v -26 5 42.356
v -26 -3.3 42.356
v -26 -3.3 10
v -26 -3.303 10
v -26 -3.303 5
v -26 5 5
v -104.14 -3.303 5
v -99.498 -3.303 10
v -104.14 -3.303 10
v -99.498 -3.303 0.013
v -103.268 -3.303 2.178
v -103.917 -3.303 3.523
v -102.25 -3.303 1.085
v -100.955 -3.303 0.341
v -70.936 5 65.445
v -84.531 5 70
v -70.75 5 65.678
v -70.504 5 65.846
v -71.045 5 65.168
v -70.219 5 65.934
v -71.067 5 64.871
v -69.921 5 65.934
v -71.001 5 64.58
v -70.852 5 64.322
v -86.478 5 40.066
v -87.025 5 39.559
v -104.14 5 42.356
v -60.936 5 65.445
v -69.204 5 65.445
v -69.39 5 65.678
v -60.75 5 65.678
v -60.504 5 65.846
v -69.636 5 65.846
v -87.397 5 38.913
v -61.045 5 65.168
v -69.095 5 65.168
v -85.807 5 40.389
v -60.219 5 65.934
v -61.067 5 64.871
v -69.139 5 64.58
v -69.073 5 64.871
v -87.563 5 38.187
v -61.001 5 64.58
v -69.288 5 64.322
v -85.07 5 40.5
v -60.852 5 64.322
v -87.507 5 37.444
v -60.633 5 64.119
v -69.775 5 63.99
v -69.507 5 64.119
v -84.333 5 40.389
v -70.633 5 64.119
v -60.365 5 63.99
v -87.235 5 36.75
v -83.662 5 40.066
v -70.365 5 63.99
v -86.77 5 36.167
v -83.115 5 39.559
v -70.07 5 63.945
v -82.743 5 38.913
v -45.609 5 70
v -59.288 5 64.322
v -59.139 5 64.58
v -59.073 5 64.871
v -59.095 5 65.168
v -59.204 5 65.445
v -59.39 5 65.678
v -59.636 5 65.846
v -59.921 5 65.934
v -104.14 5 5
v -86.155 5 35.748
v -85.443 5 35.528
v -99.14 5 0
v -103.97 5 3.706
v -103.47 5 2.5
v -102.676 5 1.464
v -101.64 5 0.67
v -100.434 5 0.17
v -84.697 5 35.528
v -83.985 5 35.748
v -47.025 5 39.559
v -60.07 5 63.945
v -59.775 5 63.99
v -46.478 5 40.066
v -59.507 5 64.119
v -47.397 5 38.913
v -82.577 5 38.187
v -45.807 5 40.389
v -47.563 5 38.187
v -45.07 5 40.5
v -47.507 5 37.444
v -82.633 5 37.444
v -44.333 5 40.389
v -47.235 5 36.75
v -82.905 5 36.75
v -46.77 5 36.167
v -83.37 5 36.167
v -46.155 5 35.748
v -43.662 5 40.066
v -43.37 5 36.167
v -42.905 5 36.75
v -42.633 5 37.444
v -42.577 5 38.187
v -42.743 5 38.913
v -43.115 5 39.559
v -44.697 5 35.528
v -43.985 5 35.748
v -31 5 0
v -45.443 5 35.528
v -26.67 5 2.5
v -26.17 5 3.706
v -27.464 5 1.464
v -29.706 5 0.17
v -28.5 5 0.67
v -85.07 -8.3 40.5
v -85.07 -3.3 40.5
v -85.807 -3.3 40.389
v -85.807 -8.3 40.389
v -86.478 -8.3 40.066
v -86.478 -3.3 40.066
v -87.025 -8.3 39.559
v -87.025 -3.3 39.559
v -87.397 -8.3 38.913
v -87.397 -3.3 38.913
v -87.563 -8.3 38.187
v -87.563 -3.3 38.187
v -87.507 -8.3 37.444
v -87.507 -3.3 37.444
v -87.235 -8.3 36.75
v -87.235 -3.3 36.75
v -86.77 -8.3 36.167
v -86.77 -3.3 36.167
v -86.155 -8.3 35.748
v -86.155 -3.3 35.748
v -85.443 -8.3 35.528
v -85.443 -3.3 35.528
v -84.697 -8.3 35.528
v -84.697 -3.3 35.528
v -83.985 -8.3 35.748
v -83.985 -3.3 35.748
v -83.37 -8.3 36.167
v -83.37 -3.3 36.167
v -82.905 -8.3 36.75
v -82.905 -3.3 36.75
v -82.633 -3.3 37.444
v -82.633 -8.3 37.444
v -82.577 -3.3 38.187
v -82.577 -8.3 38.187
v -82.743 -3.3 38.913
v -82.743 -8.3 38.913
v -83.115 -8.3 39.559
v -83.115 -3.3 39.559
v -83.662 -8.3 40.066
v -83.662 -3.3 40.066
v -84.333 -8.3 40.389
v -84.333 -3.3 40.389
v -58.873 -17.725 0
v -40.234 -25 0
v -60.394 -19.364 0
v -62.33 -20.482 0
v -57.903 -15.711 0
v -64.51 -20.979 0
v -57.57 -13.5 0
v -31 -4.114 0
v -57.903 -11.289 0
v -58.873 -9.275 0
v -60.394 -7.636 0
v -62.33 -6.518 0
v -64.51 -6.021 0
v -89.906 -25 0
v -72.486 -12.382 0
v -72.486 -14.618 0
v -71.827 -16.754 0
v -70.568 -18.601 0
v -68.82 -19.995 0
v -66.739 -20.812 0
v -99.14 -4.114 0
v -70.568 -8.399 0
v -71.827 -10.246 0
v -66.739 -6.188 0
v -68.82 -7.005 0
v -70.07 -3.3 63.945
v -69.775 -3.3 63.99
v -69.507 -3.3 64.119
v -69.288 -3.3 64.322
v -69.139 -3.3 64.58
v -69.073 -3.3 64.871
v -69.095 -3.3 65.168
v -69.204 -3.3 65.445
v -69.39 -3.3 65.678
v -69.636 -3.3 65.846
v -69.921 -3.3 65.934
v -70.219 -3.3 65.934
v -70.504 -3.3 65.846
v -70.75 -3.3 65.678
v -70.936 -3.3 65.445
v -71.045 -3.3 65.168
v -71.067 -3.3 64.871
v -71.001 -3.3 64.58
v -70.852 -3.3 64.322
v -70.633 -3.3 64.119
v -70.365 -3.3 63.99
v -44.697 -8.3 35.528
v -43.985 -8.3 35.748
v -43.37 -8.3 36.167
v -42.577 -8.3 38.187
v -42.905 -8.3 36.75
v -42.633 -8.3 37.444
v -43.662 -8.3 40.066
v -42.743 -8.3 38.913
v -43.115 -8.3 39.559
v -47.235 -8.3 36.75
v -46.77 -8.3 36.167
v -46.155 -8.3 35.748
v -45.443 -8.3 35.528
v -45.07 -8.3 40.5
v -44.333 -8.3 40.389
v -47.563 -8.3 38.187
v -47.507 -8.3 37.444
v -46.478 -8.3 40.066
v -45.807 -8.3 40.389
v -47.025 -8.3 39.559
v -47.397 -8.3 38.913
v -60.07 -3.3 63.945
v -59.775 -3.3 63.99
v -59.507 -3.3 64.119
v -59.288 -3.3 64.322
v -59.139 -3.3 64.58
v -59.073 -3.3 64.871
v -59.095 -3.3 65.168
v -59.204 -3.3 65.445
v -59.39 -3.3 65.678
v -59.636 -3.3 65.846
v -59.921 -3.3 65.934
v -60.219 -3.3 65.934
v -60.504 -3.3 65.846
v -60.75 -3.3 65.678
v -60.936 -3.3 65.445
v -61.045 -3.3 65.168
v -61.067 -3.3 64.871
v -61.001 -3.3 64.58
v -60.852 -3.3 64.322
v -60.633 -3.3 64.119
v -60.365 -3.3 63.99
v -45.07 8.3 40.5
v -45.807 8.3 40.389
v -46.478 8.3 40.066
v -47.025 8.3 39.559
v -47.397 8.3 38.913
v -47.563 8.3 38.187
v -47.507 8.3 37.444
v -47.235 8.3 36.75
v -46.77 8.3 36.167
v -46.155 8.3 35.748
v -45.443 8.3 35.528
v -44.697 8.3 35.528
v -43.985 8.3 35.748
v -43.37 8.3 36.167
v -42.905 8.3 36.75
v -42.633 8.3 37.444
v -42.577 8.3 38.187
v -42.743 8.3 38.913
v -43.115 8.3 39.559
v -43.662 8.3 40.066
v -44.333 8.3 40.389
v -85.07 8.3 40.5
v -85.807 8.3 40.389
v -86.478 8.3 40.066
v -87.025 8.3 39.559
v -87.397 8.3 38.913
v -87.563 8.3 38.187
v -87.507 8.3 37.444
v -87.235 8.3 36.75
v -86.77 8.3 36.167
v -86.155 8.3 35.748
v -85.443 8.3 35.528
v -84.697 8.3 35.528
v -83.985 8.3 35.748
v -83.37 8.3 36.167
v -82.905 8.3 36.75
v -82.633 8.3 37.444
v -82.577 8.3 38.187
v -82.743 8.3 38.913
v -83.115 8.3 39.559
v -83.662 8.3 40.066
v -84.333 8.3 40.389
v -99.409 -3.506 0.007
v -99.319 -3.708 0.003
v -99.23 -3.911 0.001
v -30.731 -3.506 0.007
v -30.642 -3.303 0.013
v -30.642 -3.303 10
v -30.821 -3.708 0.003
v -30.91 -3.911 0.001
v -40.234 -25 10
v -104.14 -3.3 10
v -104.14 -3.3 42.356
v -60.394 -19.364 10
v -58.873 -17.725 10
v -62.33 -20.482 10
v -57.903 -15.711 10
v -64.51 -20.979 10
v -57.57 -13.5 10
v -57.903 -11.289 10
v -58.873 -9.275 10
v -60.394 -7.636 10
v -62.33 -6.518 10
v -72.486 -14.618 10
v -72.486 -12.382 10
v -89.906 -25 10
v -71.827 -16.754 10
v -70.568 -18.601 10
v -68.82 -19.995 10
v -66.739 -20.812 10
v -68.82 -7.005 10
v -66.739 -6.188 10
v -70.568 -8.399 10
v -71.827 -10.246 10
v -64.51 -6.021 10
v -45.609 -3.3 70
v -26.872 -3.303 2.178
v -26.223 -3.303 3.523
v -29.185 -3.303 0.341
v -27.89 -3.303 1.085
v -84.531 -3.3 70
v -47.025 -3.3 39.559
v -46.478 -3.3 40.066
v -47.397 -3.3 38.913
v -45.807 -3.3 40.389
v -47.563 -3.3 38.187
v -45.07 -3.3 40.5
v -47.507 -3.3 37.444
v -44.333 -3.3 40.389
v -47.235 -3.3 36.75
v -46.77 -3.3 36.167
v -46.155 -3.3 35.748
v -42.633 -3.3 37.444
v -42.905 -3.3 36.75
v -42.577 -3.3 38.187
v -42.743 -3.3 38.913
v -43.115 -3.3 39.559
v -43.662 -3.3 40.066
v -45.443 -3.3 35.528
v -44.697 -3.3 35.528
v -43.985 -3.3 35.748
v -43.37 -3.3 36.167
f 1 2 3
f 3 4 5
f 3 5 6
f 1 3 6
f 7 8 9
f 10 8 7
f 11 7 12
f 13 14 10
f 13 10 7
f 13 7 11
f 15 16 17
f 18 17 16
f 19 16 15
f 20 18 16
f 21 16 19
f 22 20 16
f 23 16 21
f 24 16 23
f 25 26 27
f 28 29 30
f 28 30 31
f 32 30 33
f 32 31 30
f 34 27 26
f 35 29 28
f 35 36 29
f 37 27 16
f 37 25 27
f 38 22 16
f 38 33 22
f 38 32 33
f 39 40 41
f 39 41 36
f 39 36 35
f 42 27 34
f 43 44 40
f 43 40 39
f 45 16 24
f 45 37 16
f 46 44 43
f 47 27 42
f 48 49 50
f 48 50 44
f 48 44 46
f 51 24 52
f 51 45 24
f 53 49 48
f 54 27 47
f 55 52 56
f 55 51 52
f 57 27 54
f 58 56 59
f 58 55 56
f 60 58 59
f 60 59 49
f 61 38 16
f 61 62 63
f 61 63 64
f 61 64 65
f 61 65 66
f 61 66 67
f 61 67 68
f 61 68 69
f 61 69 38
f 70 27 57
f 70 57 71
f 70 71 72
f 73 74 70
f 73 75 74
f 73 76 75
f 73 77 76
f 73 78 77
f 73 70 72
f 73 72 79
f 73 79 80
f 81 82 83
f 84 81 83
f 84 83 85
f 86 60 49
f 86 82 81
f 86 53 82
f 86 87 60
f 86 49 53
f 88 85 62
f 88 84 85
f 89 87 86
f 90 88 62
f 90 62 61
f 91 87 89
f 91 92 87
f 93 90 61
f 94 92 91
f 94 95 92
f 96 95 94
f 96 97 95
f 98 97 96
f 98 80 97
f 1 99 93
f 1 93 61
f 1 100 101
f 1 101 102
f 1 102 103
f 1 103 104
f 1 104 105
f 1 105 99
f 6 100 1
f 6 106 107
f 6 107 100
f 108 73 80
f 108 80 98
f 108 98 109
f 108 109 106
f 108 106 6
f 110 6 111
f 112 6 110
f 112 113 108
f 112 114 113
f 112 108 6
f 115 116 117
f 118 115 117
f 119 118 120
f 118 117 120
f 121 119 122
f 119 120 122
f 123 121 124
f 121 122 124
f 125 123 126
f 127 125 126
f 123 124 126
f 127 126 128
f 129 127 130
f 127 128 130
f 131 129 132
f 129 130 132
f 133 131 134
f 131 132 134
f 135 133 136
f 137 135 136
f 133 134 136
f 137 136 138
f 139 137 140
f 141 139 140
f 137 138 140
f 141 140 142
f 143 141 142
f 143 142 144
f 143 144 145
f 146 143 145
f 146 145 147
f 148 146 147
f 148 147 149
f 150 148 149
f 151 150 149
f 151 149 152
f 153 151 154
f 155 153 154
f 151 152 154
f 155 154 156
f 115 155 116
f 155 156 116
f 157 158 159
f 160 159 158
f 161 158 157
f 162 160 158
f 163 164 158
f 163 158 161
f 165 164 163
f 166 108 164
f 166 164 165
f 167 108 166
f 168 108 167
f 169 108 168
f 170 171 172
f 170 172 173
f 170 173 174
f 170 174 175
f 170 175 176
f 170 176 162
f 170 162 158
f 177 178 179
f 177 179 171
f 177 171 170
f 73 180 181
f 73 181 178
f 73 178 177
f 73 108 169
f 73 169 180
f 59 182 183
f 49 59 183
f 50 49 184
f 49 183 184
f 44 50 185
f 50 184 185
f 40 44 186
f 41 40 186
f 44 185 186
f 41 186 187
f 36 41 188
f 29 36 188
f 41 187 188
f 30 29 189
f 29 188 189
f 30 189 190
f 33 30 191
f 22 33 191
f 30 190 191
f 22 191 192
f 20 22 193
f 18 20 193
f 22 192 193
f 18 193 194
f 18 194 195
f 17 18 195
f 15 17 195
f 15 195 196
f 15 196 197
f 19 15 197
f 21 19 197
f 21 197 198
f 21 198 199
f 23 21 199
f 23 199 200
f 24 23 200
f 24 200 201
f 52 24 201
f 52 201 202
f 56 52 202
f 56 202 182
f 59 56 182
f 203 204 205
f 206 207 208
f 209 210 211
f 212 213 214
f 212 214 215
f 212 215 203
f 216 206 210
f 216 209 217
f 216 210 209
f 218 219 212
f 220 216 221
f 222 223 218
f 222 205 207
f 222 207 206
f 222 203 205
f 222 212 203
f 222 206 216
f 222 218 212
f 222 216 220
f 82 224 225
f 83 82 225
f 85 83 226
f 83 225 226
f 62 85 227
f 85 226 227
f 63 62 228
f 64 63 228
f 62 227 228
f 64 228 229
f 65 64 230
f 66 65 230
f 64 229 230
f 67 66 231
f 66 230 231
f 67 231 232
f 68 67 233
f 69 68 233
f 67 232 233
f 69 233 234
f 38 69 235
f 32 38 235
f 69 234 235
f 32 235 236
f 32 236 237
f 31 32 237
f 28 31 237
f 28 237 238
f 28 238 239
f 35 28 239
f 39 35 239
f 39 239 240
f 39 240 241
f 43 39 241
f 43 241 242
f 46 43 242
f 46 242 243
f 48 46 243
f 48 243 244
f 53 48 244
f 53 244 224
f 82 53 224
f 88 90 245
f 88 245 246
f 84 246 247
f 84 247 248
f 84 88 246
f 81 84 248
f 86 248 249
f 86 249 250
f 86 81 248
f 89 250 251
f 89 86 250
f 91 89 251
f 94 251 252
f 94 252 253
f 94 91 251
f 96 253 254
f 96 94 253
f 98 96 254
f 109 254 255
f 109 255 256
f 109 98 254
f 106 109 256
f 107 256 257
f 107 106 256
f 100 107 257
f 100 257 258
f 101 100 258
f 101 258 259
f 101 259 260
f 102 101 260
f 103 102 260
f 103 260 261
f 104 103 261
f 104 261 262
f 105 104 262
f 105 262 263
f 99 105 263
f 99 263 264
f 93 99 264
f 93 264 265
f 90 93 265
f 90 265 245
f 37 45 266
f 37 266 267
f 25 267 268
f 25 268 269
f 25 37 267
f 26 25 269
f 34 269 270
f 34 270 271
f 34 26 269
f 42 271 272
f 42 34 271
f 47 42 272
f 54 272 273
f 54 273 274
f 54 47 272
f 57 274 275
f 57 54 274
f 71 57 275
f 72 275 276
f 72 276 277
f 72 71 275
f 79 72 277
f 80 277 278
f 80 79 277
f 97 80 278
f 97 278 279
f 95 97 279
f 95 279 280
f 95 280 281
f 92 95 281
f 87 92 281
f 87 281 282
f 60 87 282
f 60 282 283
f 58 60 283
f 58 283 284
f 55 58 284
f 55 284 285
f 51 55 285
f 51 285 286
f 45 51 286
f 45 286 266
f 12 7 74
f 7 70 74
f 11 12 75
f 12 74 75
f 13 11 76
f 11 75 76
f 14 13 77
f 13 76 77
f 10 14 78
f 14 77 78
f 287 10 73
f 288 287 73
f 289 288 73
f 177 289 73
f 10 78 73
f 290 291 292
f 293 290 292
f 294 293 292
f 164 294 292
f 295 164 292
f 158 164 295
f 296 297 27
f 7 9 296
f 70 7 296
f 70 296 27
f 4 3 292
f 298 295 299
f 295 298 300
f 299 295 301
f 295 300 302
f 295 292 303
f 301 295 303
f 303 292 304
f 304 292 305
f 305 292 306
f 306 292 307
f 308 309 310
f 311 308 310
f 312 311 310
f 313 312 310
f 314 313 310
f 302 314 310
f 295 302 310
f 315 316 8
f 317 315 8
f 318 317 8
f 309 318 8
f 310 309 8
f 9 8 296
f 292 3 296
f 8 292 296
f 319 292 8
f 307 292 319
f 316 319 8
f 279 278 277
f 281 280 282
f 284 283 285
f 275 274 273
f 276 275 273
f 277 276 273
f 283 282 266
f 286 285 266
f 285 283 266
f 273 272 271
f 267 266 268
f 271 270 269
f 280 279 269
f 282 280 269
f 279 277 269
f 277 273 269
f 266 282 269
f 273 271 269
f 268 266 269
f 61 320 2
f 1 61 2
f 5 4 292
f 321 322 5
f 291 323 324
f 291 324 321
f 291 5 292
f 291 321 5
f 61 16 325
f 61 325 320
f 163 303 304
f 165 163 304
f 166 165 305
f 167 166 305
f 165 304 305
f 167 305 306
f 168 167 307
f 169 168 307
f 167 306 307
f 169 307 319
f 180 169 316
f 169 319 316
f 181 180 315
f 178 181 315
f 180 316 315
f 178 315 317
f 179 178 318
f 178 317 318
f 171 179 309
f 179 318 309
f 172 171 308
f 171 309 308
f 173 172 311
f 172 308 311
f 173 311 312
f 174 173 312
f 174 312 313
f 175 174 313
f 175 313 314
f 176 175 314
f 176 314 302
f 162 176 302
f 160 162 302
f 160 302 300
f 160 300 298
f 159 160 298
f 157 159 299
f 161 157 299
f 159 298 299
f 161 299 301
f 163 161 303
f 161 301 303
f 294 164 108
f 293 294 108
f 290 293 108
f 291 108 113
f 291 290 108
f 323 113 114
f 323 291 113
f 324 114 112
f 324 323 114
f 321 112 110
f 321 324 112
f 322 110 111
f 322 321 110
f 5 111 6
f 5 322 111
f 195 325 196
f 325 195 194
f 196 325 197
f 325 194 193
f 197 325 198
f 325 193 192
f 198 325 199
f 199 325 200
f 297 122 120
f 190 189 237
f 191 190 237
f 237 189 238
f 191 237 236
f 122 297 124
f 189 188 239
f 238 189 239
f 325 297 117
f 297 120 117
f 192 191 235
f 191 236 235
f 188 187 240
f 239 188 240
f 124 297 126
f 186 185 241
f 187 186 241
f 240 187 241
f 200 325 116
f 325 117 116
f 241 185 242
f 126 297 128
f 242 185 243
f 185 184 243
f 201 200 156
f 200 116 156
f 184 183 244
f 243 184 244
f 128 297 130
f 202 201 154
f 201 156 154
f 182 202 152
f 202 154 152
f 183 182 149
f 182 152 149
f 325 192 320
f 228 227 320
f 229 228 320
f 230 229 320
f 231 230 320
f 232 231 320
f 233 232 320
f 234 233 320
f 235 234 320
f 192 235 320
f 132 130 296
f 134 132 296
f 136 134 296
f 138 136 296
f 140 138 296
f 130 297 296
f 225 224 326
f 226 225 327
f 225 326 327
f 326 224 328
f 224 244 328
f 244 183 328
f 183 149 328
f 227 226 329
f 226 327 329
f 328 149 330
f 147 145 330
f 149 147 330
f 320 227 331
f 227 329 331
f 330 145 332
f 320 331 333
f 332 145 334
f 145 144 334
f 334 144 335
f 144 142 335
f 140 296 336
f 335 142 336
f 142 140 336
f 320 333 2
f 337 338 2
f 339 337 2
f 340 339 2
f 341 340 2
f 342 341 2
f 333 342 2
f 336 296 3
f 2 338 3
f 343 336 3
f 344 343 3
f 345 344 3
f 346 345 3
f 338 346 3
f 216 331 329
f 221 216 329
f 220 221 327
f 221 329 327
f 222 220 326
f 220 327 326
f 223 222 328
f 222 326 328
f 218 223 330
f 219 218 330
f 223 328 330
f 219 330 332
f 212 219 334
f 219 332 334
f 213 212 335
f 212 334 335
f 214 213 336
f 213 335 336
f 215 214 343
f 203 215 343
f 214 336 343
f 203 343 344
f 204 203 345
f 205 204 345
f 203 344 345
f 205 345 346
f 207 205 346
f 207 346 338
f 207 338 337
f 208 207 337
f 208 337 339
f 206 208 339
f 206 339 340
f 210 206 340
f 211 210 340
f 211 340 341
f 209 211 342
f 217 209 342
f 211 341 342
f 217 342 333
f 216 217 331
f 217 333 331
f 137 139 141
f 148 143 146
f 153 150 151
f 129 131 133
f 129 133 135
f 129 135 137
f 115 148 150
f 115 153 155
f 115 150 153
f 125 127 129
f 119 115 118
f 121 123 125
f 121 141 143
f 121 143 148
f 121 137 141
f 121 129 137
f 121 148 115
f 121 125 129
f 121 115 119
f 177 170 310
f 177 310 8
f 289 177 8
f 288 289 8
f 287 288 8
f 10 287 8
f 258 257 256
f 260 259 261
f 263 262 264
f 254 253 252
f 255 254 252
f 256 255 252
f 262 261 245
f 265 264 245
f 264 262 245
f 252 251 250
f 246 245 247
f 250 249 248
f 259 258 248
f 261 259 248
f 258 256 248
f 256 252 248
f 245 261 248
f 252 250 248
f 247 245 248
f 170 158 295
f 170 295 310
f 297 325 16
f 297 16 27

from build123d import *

# Parameters (mm, degrees)
BOSS_EXTRUDE1_DEPTH = 10
SKETCH2_W           = 78.14
SKETCH2_H           = 8.3
BOSS_EXTRUDE2_DEPTH = 60
SKETCH3_R           = 7.5
CUT_EXTRUDE1_DEPTH  = 10
FILLET1_R           = 5
CUT_EXTRUDE2_DEPTH  = 10
SKETCH5_R           = 2.5
BOSS_EXTRUDE3_DEPTH = 5
SKETCH7_R           = 1
CUT_EXTRUDE3_DEPTH  = 10


with BuildPart() as part:
    # Sketch1 → Boss-Extrude1 (new body)
    with BuildSketch(Plane.XY):
        Polygon((-104.14, 5), (-26, 5), (-26, -3.303087832), (-30.641562484, -3.303087832), (-40.234218738, -25), (-89.905781262, -25), (-99.498437516, -3.303087832), (-104.14, -3.303087832), align=None)
    extrude(amount=BOSS_EXTRUDE1_DEPTH)

    # Sketch2 → Boss-Extrude2 (add)
    with BuildSketch(Plane.XY.offset(10)):
        with Locations((-65.07, 0.85)):
            Rectangle(SKETCH2_W, SKETCH2_H)
    extrude(amount=BOSS_EXTRUDE2_DEPTH)

    # Sketch3 → Cut-Extrude1 (cut)
    with BuildSketch(Plane.XY.offset(10)):
        with Locations((-65.07, -13.5)):
            Circle(SKETCH3_R)
    extrude(amount=-CUT_EXTRUDE1_DEPTH, mode=Mode.SUBTRACT)

    # Fillet1
    fillet1_edges = [part.edges().sort_by_distance(p)[0] for p in [
        (-26, 0.848456084, 0),
        (-104.14, 0.848456084, 0),
    ]]
    fillet(fillet1_edges, radius=FILLET1_R)

    # Sketch4 → Cut-Extrude2 (cut)
    with BuildSketch(Plane.XZ.offset(3.3)):
        Polygon((-84.531238134, 70), (-104.14, 42.355810036), (-104.14, 70), align=None)
        Polygon((-45.608761866, 70), (-26, 42.355810036), (-26, 70), align=None)
    extrude(amount=-CUT_EXTRUDE2_DEPTH, mode=Mode.SUBTRACT)

    # Sketch5 → Boss-Extrude3 (add)
    with BuildSketch(Plane.XZ.offset(3.3)):
        with Locations(Location((-85.07, 38, 0), (0, 0, 90))):
            Circle(SKETCH5_R)
        with Locations(Location((-45.07, 38, 0), (0, 0, 90))):
            Circle(SKETCH5_R)
    boss_extrude3 = extrude(amount=BOSS_EXTRUDE3_DEPTH)

    # Mirror1: Boss-Extrude3 across plane
    add(boss_extrude3.mirror(Plane.ZX))

    # Sketch7 → Cut-Extrude3 (cut)
    with BuildSketch(Plane.XZ.offset(3.3)):
        with Locations(Location((-60.07, 64.945333525, 0), (0, 0, 270))):
            Circle(SKETCH7_R)
        with Locations(Location((-70.07, 64.945333525, 0), (0, 0, 270))):
            Circle(SKETCH7_R)
    extrude(amount=-CUT_EXTRUDE3_DEPTH, mode=Mode.SUBTRACT)


solid = part.part
